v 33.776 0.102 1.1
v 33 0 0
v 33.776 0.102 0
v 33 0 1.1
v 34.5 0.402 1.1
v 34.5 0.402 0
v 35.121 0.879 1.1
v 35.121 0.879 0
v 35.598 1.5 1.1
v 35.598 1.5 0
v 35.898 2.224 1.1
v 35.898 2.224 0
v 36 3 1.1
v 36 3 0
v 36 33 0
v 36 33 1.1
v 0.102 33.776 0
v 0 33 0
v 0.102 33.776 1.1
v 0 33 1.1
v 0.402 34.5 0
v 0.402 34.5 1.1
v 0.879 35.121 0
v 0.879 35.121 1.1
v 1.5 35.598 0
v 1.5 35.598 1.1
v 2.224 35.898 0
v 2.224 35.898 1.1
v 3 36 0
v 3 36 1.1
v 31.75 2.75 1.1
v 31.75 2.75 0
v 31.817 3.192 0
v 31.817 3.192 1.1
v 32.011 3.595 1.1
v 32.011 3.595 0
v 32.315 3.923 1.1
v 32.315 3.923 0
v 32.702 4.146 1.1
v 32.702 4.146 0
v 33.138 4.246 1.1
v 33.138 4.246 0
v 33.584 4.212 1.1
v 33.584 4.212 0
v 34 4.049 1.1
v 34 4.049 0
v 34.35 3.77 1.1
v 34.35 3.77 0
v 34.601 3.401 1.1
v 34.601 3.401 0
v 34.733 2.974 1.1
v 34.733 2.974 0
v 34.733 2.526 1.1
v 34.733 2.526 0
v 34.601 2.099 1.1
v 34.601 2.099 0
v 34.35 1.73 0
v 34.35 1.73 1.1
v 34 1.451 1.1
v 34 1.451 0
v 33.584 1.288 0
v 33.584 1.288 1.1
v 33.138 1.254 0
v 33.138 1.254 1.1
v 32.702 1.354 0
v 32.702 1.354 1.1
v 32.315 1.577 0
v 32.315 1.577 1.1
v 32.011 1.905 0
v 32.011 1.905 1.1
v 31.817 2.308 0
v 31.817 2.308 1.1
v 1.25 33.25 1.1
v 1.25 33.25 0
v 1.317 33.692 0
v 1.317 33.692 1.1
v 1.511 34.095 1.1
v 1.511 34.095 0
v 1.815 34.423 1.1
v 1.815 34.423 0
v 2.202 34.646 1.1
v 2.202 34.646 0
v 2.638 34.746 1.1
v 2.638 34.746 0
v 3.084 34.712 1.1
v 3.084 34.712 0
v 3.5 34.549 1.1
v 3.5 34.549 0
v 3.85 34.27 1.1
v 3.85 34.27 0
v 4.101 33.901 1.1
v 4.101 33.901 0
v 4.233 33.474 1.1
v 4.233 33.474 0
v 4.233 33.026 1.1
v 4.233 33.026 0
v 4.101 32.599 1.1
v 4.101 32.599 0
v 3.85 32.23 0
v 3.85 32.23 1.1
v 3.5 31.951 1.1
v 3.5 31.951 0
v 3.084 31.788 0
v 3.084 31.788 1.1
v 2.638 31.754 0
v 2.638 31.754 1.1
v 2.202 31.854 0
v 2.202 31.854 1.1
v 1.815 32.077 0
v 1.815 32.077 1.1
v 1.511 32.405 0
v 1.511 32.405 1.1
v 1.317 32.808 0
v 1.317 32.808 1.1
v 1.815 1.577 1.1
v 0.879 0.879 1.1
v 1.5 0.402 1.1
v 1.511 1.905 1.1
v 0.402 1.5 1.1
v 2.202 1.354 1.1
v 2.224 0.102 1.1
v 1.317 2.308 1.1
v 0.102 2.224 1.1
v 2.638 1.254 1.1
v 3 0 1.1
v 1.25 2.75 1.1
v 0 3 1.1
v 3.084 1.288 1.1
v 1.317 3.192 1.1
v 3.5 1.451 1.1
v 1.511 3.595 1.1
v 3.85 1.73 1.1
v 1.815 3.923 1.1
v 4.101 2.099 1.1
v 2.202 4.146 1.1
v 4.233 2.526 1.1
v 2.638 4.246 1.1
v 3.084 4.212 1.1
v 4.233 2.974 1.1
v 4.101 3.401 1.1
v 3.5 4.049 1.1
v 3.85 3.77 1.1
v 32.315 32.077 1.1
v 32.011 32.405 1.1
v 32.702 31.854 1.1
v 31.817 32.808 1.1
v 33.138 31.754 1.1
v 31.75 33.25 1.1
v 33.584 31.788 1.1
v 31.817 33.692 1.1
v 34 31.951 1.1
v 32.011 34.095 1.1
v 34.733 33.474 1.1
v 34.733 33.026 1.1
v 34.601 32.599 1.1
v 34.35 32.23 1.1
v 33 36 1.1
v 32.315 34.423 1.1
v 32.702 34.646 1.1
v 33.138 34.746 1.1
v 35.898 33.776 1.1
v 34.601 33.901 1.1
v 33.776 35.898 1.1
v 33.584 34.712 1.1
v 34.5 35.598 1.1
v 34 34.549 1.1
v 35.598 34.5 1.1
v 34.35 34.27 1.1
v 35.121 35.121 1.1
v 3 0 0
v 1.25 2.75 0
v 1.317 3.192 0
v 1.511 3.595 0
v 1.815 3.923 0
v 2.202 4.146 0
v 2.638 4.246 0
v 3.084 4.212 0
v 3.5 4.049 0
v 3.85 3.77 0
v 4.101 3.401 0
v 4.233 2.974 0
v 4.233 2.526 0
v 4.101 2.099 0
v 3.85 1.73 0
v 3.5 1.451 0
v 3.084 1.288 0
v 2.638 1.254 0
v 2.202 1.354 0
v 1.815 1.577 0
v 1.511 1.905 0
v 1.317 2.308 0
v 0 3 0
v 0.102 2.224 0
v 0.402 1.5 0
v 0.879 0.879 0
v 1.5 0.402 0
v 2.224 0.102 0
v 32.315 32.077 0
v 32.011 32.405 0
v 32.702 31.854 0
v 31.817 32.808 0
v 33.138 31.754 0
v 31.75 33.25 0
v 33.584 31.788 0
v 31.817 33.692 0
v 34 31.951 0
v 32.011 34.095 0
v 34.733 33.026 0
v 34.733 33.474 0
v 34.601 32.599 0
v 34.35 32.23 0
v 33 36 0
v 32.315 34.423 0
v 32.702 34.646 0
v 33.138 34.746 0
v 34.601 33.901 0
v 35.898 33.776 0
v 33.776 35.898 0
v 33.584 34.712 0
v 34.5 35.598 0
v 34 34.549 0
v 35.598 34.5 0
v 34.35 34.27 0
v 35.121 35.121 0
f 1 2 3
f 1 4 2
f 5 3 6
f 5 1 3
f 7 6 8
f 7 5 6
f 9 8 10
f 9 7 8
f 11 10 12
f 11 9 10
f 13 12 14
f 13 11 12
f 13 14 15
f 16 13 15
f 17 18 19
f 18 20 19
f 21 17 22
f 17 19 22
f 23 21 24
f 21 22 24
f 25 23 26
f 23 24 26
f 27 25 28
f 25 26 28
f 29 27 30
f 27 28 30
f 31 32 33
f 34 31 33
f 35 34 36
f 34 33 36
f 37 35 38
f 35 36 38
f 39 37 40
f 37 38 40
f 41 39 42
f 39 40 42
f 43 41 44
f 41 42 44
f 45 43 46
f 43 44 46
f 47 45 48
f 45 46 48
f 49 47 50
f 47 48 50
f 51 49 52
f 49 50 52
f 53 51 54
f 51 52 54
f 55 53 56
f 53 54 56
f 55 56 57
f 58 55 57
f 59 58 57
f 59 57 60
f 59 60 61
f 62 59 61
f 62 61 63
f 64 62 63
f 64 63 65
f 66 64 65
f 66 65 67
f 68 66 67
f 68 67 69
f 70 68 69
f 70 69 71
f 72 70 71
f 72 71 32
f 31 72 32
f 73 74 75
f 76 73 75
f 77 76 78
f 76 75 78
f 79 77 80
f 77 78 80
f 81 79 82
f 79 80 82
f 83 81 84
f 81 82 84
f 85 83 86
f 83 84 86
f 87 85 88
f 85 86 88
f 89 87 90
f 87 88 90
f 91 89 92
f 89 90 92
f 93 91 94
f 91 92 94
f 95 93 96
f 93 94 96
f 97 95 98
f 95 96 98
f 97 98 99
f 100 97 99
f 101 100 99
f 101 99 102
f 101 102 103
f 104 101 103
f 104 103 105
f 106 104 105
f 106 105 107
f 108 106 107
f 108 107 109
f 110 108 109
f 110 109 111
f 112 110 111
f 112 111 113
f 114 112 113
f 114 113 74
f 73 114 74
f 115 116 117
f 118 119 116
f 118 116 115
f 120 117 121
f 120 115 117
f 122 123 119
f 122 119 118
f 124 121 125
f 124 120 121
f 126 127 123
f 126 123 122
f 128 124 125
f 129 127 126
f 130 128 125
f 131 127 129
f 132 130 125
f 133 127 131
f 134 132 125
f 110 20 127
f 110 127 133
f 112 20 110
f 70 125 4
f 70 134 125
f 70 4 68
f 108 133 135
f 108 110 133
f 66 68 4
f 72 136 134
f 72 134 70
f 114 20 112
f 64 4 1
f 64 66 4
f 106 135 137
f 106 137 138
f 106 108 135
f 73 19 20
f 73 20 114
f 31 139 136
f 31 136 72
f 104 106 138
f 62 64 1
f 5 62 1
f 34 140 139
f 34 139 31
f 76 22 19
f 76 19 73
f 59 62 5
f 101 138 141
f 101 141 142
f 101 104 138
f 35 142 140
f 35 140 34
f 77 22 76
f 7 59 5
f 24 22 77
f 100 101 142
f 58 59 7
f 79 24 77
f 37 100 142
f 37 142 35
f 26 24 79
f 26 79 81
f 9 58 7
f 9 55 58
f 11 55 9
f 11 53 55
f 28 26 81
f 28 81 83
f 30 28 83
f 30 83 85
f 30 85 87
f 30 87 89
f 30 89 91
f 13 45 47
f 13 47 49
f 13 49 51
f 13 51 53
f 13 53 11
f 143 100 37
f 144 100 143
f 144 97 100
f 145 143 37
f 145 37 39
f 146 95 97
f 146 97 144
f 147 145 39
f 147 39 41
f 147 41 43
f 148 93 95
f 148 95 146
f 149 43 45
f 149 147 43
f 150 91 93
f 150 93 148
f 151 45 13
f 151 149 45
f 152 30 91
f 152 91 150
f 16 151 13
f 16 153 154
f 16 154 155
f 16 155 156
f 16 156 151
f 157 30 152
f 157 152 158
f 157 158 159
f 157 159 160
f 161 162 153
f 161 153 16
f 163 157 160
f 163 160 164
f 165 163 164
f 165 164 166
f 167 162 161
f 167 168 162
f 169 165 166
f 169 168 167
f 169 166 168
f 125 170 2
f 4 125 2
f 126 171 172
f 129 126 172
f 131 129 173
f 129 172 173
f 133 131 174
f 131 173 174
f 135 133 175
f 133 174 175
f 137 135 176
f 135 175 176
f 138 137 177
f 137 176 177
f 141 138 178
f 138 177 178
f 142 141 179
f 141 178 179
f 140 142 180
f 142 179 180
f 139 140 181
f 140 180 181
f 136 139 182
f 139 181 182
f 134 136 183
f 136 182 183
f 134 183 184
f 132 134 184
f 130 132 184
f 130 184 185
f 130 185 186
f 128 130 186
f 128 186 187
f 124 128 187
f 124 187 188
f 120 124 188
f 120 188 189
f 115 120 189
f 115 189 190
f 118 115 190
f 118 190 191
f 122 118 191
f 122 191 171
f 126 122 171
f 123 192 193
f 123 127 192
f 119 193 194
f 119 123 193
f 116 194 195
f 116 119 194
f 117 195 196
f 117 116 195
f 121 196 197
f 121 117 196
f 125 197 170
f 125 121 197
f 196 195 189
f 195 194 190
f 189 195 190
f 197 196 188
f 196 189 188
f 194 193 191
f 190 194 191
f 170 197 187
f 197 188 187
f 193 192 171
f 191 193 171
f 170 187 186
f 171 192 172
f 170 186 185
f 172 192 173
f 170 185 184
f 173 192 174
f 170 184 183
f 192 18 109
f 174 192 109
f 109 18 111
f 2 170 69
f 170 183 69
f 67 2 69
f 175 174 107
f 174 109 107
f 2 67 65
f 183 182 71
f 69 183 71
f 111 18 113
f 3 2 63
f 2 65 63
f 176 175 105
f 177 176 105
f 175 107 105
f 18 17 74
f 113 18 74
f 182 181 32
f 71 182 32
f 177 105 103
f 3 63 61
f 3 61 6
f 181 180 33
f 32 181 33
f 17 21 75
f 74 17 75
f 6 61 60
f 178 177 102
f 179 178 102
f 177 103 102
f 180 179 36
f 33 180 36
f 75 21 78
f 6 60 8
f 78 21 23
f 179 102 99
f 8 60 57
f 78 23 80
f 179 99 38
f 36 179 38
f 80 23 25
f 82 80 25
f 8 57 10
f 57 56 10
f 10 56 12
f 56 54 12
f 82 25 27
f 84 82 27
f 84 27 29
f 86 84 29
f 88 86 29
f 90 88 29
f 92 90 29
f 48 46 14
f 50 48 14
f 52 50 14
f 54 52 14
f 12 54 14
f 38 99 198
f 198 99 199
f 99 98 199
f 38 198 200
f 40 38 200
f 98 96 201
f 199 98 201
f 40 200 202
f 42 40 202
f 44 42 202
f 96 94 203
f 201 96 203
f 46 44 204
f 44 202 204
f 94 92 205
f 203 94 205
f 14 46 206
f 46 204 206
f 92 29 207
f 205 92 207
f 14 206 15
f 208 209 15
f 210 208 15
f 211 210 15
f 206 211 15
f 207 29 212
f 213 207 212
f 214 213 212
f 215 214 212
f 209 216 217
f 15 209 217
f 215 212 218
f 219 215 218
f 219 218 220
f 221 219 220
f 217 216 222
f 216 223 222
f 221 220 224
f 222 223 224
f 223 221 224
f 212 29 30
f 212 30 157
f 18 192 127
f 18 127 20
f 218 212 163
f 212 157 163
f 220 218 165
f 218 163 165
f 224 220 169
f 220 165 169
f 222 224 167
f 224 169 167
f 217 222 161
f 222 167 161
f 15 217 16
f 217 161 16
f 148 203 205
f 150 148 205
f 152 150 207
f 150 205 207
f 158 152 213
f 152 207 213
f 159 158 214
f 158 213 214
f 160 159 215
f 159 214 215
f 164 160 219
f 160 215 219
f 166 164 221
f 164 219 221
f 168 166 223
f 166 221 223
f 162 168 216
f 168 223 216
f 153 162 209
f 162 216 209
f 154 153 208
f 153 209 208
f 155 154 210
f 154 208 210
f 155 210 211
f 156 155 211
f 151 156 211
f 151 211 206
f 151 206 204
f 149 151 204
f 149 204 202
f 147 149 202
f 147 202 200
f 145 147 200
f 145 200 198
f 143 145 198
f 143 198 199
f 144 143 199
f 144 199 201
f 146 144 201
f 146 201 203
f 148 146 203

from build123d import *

# Parameters (mm, degrees)
F0_W     = 36
F0_H     = 36
F1_DEPTH = 1.1
F3_D     = 3
F4_R     = 3


with BuildPart() as f1:
    # F0 (on Top) → F1 (new body)
    with BuildSketch(Plane.XY):
        with Locations((18, 18)):
            Rectangle(F0_W, F0_H)
    extrude(amount=F1_DEPTH)

    # F3 (through all)
    with Locations(Plane.XY.offset(1.1)):
        with Locations((2.75, 33.25), (33.25, 33.25), (2.75, 2.75), (33.25, 2.75)):
            Hole(F3_D / 2)

    # F4
    f4_edges = [f1.edges().sort_by_distance(p)[0] for p in [
        (36, 0, 0.55),
        (0, 0, 0.55),
        (0, 36, 0.55),
        (36, 36, 0.55),
    ]]
    fillet(f4_edges, radius=F4_R)


solid = f1.part
